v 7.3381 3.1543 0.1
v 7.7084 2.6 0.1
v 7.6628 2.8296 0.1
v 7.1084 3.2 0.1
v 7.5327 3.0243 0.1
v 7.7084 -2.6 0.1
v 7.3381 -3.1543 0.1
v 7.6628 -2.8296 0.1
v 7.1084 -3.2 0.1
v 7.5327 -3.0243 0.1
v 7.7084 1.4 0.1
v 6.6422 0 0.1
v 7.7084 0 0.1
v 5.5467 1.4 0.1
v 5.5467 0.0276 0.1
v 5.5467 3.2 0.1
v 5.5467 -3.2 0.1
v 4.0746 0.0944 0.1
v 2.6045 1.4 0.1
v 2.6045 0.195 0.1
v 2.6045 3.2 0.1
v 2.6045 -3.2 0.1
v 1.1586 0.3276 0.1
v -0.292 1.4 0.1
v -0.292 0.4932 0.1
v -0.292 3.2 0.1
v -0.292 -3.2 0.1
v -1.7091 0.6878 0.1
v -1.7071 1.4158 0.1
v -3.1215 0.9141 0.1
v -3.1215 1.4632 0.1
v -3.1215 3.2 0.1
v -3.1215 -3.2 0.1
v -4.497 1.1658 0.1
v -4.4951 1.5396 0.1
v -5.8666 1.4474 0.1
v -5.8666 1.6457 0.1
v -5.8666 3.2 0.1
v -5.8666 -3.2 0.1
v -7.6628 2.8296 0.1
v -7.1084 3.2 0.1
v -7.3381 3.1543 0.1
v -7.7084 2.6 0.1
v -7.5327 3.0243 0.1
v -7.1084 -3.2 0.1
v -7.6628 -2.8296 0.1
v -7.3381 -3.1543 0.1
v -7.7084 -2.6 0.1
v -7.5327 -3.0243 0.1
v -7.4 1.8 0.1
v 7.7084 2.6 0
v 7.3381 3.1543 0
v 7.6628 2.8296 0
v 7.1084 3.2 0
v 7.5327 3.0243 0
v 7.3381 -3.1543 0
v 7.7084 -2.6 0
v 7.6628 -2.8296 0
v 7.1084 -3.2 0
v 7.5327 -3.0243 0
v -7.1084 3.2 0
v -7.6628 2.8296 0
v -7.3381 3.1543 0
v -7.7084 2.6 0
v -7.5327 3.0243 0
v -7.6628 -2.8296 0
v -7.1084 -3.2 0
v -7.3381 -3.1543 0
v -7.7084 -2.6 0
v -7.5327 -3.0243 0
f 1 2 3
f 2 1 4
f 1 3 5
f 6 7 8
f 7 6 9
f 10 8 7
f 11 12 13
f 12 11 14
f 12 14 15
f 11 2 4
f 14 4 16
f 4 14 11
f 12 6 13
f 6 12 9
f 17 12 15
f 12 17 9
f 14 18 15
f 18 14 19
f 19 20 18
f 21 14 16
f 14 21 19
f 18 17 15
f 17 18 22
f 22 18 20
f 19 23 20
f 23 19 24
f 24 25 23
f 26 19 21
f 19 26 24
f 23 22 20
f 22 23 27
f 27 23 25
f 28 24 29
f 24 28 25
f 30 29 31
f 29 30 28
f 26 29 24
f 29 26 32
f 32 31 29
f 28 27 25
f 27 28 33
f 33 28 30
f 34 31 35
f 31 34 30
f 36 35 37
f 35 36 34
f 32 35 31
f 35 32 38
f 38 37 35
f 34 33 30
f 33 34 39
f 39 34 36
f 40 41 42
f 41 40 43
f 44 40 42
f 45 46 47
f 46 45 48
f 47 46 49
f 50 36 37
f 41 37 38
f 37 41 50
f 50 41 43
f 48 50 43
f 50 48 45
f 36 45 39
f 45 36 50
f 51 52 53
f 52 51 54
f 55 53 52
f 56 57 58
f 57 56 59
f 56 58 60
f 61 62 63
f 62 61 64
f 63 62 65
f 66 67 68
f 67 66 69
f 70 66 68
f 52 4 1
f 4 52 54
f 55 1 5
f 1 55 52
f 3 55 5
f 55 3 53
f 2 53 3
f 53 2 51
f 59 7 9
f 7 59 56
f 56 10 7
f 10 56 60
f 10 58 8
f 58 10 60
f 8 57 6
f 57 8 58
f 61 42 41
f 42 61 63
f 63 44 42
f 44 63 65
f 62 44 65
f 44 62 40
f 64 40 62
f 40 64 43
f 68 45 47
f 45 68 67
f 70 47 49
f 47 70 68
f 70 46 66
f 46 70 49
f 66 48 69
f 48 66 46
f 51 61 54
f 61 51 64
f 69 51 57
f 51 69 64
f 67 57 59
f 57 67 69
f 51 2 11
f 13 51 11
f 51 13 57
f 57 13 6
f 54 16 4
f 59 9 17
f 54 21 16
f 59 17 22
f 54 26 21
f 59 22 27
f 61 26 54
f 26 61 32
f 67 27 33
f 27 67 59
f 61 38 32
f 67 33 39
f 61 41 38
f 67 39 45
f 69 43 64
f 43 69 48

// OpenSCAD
// file: ../p/1-4cyli.scad
use <../lib.scad>
function ldraw_lib__1_4cyli() = [
// 0 Cylinder 0.25
// 0 Name: 1-4cyli.dat
// 0 Author: James Jessiman
// 0 !LDRAW_ORG Primitive UPDATE 2012-01
// 0 !LICENSE Licensed under CC BY 4.0 : see CAreadme.txt
// 
// 0 BFC CERTIFY CCW
  [0,"BFC","CERTIFY"],
  [0,"BFC","CCW"],
// 
// 0 !HISTORY 2002-03-23 [sbliss] Added BFC statement.
// 0 !HISTORY 2002-04-25 [PTadmin] Official Update 2002-02
// 0 !HISTORY 2007-06-22 [PTadmin] Header formatted for Contributor Agreement
// 0 !HISTORY 2008-07-01 [PTadmin] Official Update 2008-01
// 0 !HISTORY 2012-02-16 [Philo] Changed to CCW
// 0 !HISTORY 2012-03-30 [PTadmin] Official Update 2012-01
// 
// 
// 4 16 1 1 0 0.9239 1 0.3827 0.9239 0 0.3827 1 0 0
  [4,16,1,1,0,0.9239,1,0.3827,0.9239,0,0.3827,1,0,0],
// 5 24 1 0 0 1 1 0 0.9239 0 0.3827 1 0 -1
  [5,24,1,0,0,1,1,0,0.9239,0,0.3827,1,0,-1],
// 4 16 0.9239 1 0.3827 0.7071 1 0.7071 0.7071 0 0.7071 0.9239 0 0.3827
  [4,16,0.9239,1,0.3827,0.7071,1,0.7071,0.7071,0,0.7071,0.9239,0,0.3827],
// 5 24 0.9239 0 0.3827 0.9239 1 0.3827 0.7071 0 0.7071 1 0 0
  [5,24,0.9239,0,0.3827,0.9239,1,0.3827,0.7071,0,0.7071,1,0,0],
// 4 16 0.7071 1 0.7071 0.3827 1 0.9239 0.3827 0 0.9239 0.7071 0 0.7071
  [4,16,0.7071,1,0.7071,0.3827,1,0.9239,0.3827,0,0.9239,0.7071,0,0.7071],
// 5 24 0.7071 0 0.7071 0.7071 1 0.7071 0.3827 0 0.9239 0.9239 0 0.3827
  [5,24,0.7071,0,0.7071,0.7071,1,0.7071,0.3827,0,0.9239,0.9239,0,0.3827],
// 4 16 0.3827 1 0.9239 0 1 1 0 0 1 0.3827 0 0.9239
  [4,16,0.3827,1,0.9239,0,1,1,0,0,1,0.3827,0,0.9239],
// 5 24 0.3827 0 0.9239 0.3827 1 0.9239 0 0 1 0.7071 0 0.7071
  [5,24,0.3827,0,0.9239,0.3827,1,0.9239,0,0,1,0.7071,0,0.7071],
// 5 24 0 0 1 0 1 1 0.3827 0 0.9239 -1 0 1
  [5,24,0,0,1,0,1,1,0.3827,0,0.9239,-1,0,1],
];
module ldraw_lib__1_4cyli(step=0, col=false, unit=2/5, alt=false, line=0.2, solid=!$preview)
    makepoly(ldraw_lib__1_4cyli(), step=step, col=col, unit=unit, alt=alt, line=line, solid=solid);
ldraw_lib__1_4cyli(line=0.2);
// file: ../p/1-4chrd.scad
use <../lib.scad>
function ldraw_lib__1_4chrd() = [
// 0 Chord 0.25
// 0 Name: 1-4chrd.dat
// 0 Author: Tony Hafner [hafhead]
// 0 !LDRAW_ORG Primitive UPDATE 2012-02
// 0 !LICENSE Licensed under CC BY 2.0 and CC BY 4.0 : see CAreadme.txt
// 
// 0 BFC CERTIFY CCW
  [0,"BFC","CERTIFY"],
  [0,"BFC","CCW"],
// 
// 0 !HISTORY 2004-04-22 [PTadmin] Official Update 2004-02
// 0 !HISTORY 2007-10-09 [PTadmin] Header formatted for Contributor Agreement
// 0 !HISTORY 2008-07-01 [PTadmin] Official Update 2008-01
// 0 !HISTORY 2012-08-02 [MMR1988] Re-creation with PrimGen2 and Rectifier
// 0 !HISTORY 2012-08-09 [PTadmin] Official Update 2012-02
// 
// 
// 4 16 0.9239 0 0.3827 0.3827 0 0.9239 0 0 1 1 0 0
  [4,16,0.9239,0,0.3827,0.3827,0,0.9239,0,0,1,1,0,0],
// 3 16 0.7071 0 0.7071 0.3827 0 0.9239 0.9239 0 0.3827
  [3,16,0.7071,0,0.7071,0.3827,0,0.9239,0.9239,0,0.3827],
];
module ldraw_lib__1_4chrd(step=0, col=false, unit=2/5, alt=false, line=0.2, solid=!$preview)
    makepoly(ldraw_lib__1_4chrd(), step=step, col=col, unit=unit, alt=alt, line=line, solid=solid);
ldraw_lib__1_4chrd(line=0.2);
// file: s/6142617fs07.scad
use <../../lib.scad>
use <../../p/1-4chrd.scad>
use <../../p/1-4cyli.scad>
function ldraw_lib__s__6142617fs07() = [
// 0 ~Sticker  0.8 x  1.9 with Black Arc on Red Background Left - Bottom Face
// 0 Name: s\6142617fs07.dat
// 0 Author: Massimo Maso [Sirio]
// 0 !LDRAW_ORG Subpart UPDATE 2023-04
// 0 !LICENSE Licensed under CC BY 4.0 : see CAreadme.txt
// 
// 0 BFC CERTIFY CCW
  [0,"BFC","CERTIFY"],
  [0,"BFC","CCW"],
// 
// 0 !HISTORY 2023-08-25 [OrionP] Official Update 2023-04
// 
// 
// 0 // Primitives
// 1 16 -6.5 0 17.7711 -1.5 0 0 0 -1 0 0 0 1.5 1-4chrd.dat
  [1,16,-6.5,0,17.7711,-1.5,0,0,0,-1,0,0,0,1.5, ldraw_lib__1_4chrd()],
// 1 16 6.5 0 17.7711 1.5 0 0 0 -1 0 0 0 1.5 1-4chrd.dat
  [1,16,6.5,0,17.7711,1.5,0,0,0,-1,0,0,0,1.5, ldraw_lib__1_4chrd()],
// 1 16 -6.5 0 -17.7711 -1.5 0 0 0 -1 0 0 0 -1.5 1-4chrd.dat
  [1,16,-6.5,0,-17.7711,-1.5,0,0,0,-1,0,0,0,-1.5, ldraw_lib__1_4chrd()],
// 1 16 6.5 0 -17.7711 1.5 0 0 0 -1 0 0 0 -1.5 1-4chrd.dat
  [1,16,6.5,0,-17.7711,1.5,0,0,0,-1,0,0,0,-1.5, ldraw_lib__1_4chrd()],
// 1 16 -6.5 -0.25 17.7711 -1.5 0 0 0 0.25 0 0 0 1.5 1-4cyli.dat
  [1,16,-6.5,-0.25,17.7711,-1.5,0,0,0,0.25,0,0,0,1.5, ldraw_lib__1_4cyli()],
// 1 16 6.5 -0.25 17.7711 1.5 0 0 0 0.25 0 0 0 1.5 1-4cyli.dat
  [1,16,6.5,-0.25,17.7711,1.5,0,0,0,0.25,0,0,0,1.5, ldraw_lib__1_4cyli()],
// 1 16 -6.5 -0.25 -17.7711 -1.5 0 0 0 0.25 0 0 0 -1.5 1-4cyli.dat
  [1,16,-6.5,-0.25,-17.7711,-1.5,0,0,0,0.25,0,0,0,-1.5, ldraw_lib__1_4cyli()],
// 1 16 6.5 -0.25 -17.7711 1.5 0 0 0 0.25 0 0 0 -1.5 1-4cyli.dat
  [1,16,6.5,-0.25,-17.7711,1.5,0,0,0,0.25,0,0,0,-1.5, ldraw_lib__1_4cyli()],
// 0 // Bottom face
// 4 16 -6.5 0 19.2711 -6.5 0 -19.2711 -8 0 -17.7711 -8 0 17.7711
  [4,16,-6.5,0,19.2711,-6.5,0,-19.2711,-8,0,-17.7711,-8,0,17.7711],
// 4 16 -6.5 0 19.2711 6.5 0 19.2711 6.5 0 -19.2711 -6.5 0 -19.2711
  [4,16,-6.5,0,19.2711,6.5,0,19.2711,6.5,0,-19.2711,-6.5,0,-19.2711],
// 4 16 6.5 0 19.2711 8 0 17.7711 8 0 -17.7711 6.5 0 -19.2711
  [4,16,6.5,0,19.2711,8,0,17.7711,8,0,-17.7711,6.5,0,-19.2711],
// 0 // Lateral face
// 3 16 -6.5 0 19.2711 -6.5 -.25 19.2711 -3.5 -.25 19.2711
  [3,16,-6.5,0,19.2711,-6.5,-.25,19.2711,-3.5,-.25,19.2711],
// 4 16 -6.5 0 19.2711 -3.5 -.25 19.2711 0 -.25 19.2711 6.5 0 19.2711
  [4,16,-6.5,0,19.2711,-3.5,-.25,19.2711,0,-.25,19.2711,6.5,0,19.2711],
// 3 16 6.5 0 19.2711 0 -.25 19.2711 6.5 -.25 19.2711
  [3,16,6.5,0,19.2711,0,-.25,19.2711,6.5,-.25,19.2711],
// 3 16 -8 0 17.7711 -8 -.25 13.8668 -8 -.25 17.7711
  [3,16,-8,0,17.7711,-8,-.25,13.8668,-8,-.25,17.7711],
// 3 16 8 0 17.7711 8 -.25 17.7711 8 -.25 13.8668
  [3,16,8,0,17.7711,8,-.25,17.7711,8,-.25,13.8668],
// 3 16 -8 0 17.7711 -8 -.25 6.5112 -8 -.25 13.8668
  [3,16,-8,0,17.7711,-8,-.25,6.5112,-8,-.25,13.8668],
// 3 16 8 0 17.7711 8 -.25 13.8668 8 -.25 6.5112
  [3,16,8,0,17.7711,8,-.25,13.8668,8,-.25,6.5112],
// 3 16 -8 0 17.7711 -8 -.25 -.73 -8 -.25 6.5112
  [3,16,-8,0,17.7711,-8,-.25,-.73,-8,-.25,6.5112],
// 3 16 8 0 17.7711 8 -.25 6.5112 8 -.25 -.73
  [3,16,8,0,17.7711,8,-.25,6.5112,8,-.25,-.73],
// 4 16 -8 0 17.7711 -8 0 -17.7711 -8 -.25 -7.8038 -8 -.25 -.73
  [4,16,-8,0,17.7711,-8,0,-17.7711,-8,-.25,-7.8038,-8,-.25,-.73],
// 4 16 8 0 17.7711 8 -.25 -.73 8 -.25 -7.8038 8 0 -17.7711
  [4,16,8,0,17.7711,8,-.25,-.73,8,-.25,-7.8038,8,0,-17.7711],
// 3 16 -8 0 -17.7711 -8 -.25 -14.6666 -8 -.25 -7.8038
  [3,16,-8,0,-17.7711,-8,-.25,-14.6666,-8,-.25,-7.8038],
// 3 16 8 0 -17.7711 8 -.25 -7.8038 8 -.25 -14.6666
  [3,16,8,0,-17.7711,8,-.25,-7.8038,8,-.25,-14.6666],
// 3 16 -8 0 -17.7711 -8 -.25 -17.7711 -8 -.25 -14.6666
  [3,16,-8,0,-17.7711,-8,-.25,-17.7711,-8,-.25,-14.6666],
// 3 16 8 0 -17.7711 8 -.25 -14.6666 8 -.25 -17.7711
  [3,16,8,0,-17.7711,8,-.25,-14.6666,8,-.25,-17.7711],
// 4 16 -6.5 0 -19.2711 6.5 0 -19.2711 6.5 -.25 -19.2711 -6.5 -.25 -19.2711
  [4,16,-6.5,0,-19.2711,6.5,0,-19.2711,6.5,-.25,-19.2711,-6.5,-.25,-19.2711],
];
module ldraw_lib__s__6142617fs07(step=0, col=false, unit=2/5, alt=false, line=0.2, solid=!$preview)
    makepoly(ldraw_lib__s__6142617fs07(), step=step, col=col, unit=unit, alt=alt, line=line, solid=solid);
ldraw_lib__s__6142617fs07(line=0.2);
// file: s/6142617fs06.scad
use <../../lib.scad>
use <../../p/1-4chrd.scad>
function ldraw_lib__s__6142617fs06() = [
// 0 ~Sticker  0.8 x  1.9 with Black Arc on Red Background Left - Sixth Face
// 0 Name: s\6142617fs06.dat
// 0 Author: Massimo Maso [Sirio]
// 0 !LDRAW_ORG Subpart UPDATE 2023-04
// 0 !LICENSE Licensed under CC BY 4.0 : see CAreadme.txt
// 
// 0 BFC CERTIFY CCW
  [0,"BFC","CERTIFY"],
  [0,"BFC","CCW"],
// 
// 0 !HISTORY 2023-08-25 [OrionP] Official Update 2023-04
// 
// 
// 0 // Primitives
// 1 4 -6.5 -.25 -3.0901 -1.5 0 0 0 1 0 0 0 -1.5 1-4chrd.dat
  [1,4,-6.5,-.25,-3.0901,-1.5,0,0,0,1,0,0,0,-1.5, ldraw_lib__1_4chrd()],
// 1 4 6.5 -.25 -3.0901 1.5 0 0 0 1 0 0 0 -1.5 1-4chrd.dat
  [1,4,6.5,-.25,-3.0901,1.5,0,0,0,1,0,0,0,-1.5, ldraw_lib__1_4chrd()],
// 0 // Black faces
// 3 0 -4.5 -.25 -3.819 -3.6185 -.25 .0144 -4.1143 -.25 .0144
  [3,0,-4.5,-.25,-3.819,-3.6185,-.25,.0144,-4.1143,-.25,.0144],
// 0 // Red faces
// 4 4 -4.5 -.25 -3.819 -4.1143 -.25 .0144 -8 -.25 .0144 -8 -.25 -3.0901
  [4,4,-4.5,-.25,-3.819,-4.1143,-.25,.0144,-8,-.25,.0144,-8,-.25,-3.0901],
// 3 4 -4.5 -.25 -3.819 -8 -.25 -3.0901 -6.5 -.25 -4.5901
  [3,4,-4.5,-.25,-3.819,-8,-.25,-3.0901,-6.5,-.25,-4.5901],
// 4 4 -4.5 -.25 -3.819 -6.5 -.25 -4.5901 6.5 -.25 -4.5901 8 -.25 -3.0901
  [4,4,-4.5,-.25,-3.819,-6.5,-.25,-4.5901,6.5,-.25,-4.5901,8,-.25,-3.0901],
// 4 4 -4.5 -.25 -3.819 8 -.25 -3.0901 8 -.25 .0144 -3.6185 -.25 .0144
  [4,4,-4.5,-.25,-3.819,8,-.25,-3.0901,8,-.25,.0144,-3.6185,-.25,.0144],
];
module ldraw_lib__s__6142617fs06(step=0, col=false, unit=2/5, alt=false, line=0.2, solid=!$preview)
    makepoly(ldraw_lib__s__6142617fs06(), step=step, col=col, unit=unit, alt=alt, line=line, solid=solid);
ldraw_lib__s__6142617fs06(line=0.2);
// file: s/6142617fs05.scad
use <../../lib.scad>
function ldraw_lib__s__6142617fs05() = [
// 0 ~Sticker  0.8 x  1.9 with Black Arc on Red Background Left - Fifth Face
// 0 Name: s\6142617fs05.dat
// 0 Author: Massimo Maso [Sirio]
// 0 !LDRAW_ORG Subpart UPDATE 2023-04
// 0 !LICENSE Licensed under CC BY 4.0 : see CAreadme.txt
// 
// 0 BFC CERTIFY CCW
  [0,"BFC","CERTIFY"],
  [0,"BFC","CCW"],
// 
// 0 !HISTORY 2023-08-25 [OrionP] Official Update 2023-04
// 
// 
// 0 // Black faces
// 4 0 -3.8489 -.25 3.4145 -2.9144 -.25 3.4097 -2.2852 -.25 6.8484 -3.658 -.25 6.8484
  [4,0,-3.8489,-.25,3.4145,-2.9144,-.25,3.4097,-2.2852,-.25,6.8484,-3.658,-.25,6.8484],
// 4 0 -3.8489 -.25 3.4145 -4.1143 -.25 -.0144 -3.6185 -.25 -.0144 -2.9144 -.25 3.4097
  [4,0,-3.8489,-.25,3.4145,-4.1143,-.25,-.0144,-3.6185,-.25,-.0144,-2.9144,-.25,3.4097],
// 0 // Red faces
// 4 4 -8 -.25 -.0144 -3.8489 -.25 3.4145 -3.658 -.25 6.8484 -8 -.25 6.8484
  [4,4,-8,-.25,-.0144,-3.8489,-.25,3.4145,-3.658,-.25,6.8484,-8,-.25,6.8484],
// 3 4 -8 -.25 -.0144 -4.1143 -.25 -.0144 -3.8489 -.25 3.4145
  [3,4,-8,-.25,-.0144,-4.1143,-.25,-.0144,-3.8489,-.25,3.4145],
// 4 4 8 -.25 -.0144 8 -.25 6.8484 -2.2852 -.25 6.8484 -2.9144 -.25 3.4097
  [4,4,8,-.25,-.0144,8,-.25,6.8484,-2.2852,-.25,6.8484,-2.9144,-.25,3.4097],
// 3 4 8 -.25 -.0144 -2.9144 -.25 3.4097 -3.6185 -.25 -.0144
  [3,4,8,-.25,-.0144,-2.9144,-.25,3.4097,-3.6185,-.25,-.0144],
];
module ldraw_lib__s__6142617fs05(step=0, col=false, unit=2/5, alt=false, line=0.2, solid=!$preview)
    makepoly(ldraw_lib__s__6142617fs05(), step=step, col=col, unit=unit, alt=alt, line=line, solid=solid);
ldraw_lib__s__6142617fs05(line=0.2);
// file: s/6142617fs04.scad
use <../../lib.scad>
function ldraw_lib__s__6142617fs04() = [
// 0 ~Sticker  0.8 x  1.9 with Black Arc on Red Background Left - Fourth Face
// 0 Name: s\6142617fs04.dat
// 0 Author: Massimo Maso [Sirio]
// 0 !LDRAW_ORG Subpart UPDATE 2023-04
// 0 !LICENSE Licensed under CC BY 4.0 : see CAreadme.txt
// 
// 0 BFC CERTIFY CCW
  [0,"BFC","CERTIFY"],
  [0,"BFC","CCW"],
// 
// 0 !HISTORY 2023-08-25 [OrionP] Official Update 2023-04
// 
// 
// 0 // Black faces
// 
// 4 0 -3.5395 -.25 -3.525 -1.7195 -.25 -3.53 -1.2329 -.25 .0128 -3.5 -.25 .0128
  [4,0,-3.5395,-.25,-3.525,-1.7195,-.25,-3.53,-1.2329,-.25,.0128,-3.5,-.25,.0128],
// 4 0 -3.5395 -.25 -3.525 -3.658 -.25 -7.061 -2.2852 -.25 -7.061 -1.7195 -.25 -3.53
  [4,0,-3.5395,-.25,-3.525,-3.658,-.25,-7.061,-2.2852,-.25,-7.061,-1.7195,-.25,-3.53],
// 0 // Red faces
// 4 4 -8 -.25 -7.061 -3.5395 -.25 -3.525 -3.5 -.25 .0128 -8 -.25 .0128
  [4,4,-8,-.25,-7.061,-3.5395,-.25,-3.525,-3.5,-.25,.0128,-8,-.25,.0128],
// 3 4 -8 -.25 -7.061 -3.658 -.25 -7.061 -3.5395 -.25 -3.525
  [3,4,-8,-.25,-7.061,-3.658,-.25,-7.061,-3.5395,-.25,-3.525],
// 4 4 8 -.25 -7.061 8 -.25 .0128 -1.2329 -.25 .0128 -1.7195 -.25 -3.53
  [4,4,8,-.25,-7.061,8,-.25,.0128,-1.2329,-.25,.0128,-1.7195,-.25,-3.53],
// 3 4 8 -.25 -7.061 -1.7195 -.25 -3.53 -2.2852 -.25 -7.061
  [3,4,8,-.25,-7.061,-1.7195,-.25,-3.53,-2.2852,-.25,-7.061],
];
module ldraw_lib__s__6142617fs04(step=0, col=false, unit=2/5, alt=false, line=0.2, solid=!$preview)
    makepoly(ldraw_lib__s__6142617fs04(), step=step, col=col, unit=unit, alt=alt, line=line, solid=solid);
ldraw_lib__s__6142617fs04(line=0.2);
// file: s/6142617fs03.scad
use <../../lib.scad>
function ldraw_lib__s__6142617fs03() = [
// 0 ~Sticker  0.8 x  1.9 with Black Arc on Red Background Left - Third Face
// 0 Name: s\6142617fs03.dat
// 0 Author: Massimo Maso [Sirio]
// 0 !LDRAW_ORG Subpart UPDATE 2023-04
// 0 !LICENSE Licensed under CC BY 4.0 : see CAreadme.txt
// 
// 0 BFC CERTIFY CCW
  [0,"BFC","CERTIFY"],
  [0,"BFC","CCW"],
// 
// 0 !HISTORY 2023-08-25 [OrionP] Official Update 2023-04
// 
// 
// 0 // Black faces
// 
// 4 0 -3.5 -.25 -.0128 -.8189 -.25 3.6136 -.4874 -.25 7.2284 -3.5 -.25 7.2284
  [4,0,-3.5,-.25,-.0128,-.8189,-.25,3.6136,-.4874,-.25,7.2284,-3.5,-.25,7.2284],
// 3 0 -3.5 -.25 -.0128 -1.2329 -.25 -.0128 -.8189 -.25 3.6136
  [3,0,-3.5,-.25,-.0128,-1.2329,-.25,-.0128,-.8189,-.25,3.6136],
// 0 // Red faces
// 4 4 -8 -.25 7.2284 -8 -.25 -.0128 -3.5 -.25 -.0128 -3.5 -.25 7.2284
  [4,4,-8,-.25,7.2284,-8,-.25,-.0128,-3.5,-.25,-.0128,-3.5,-.25,7.2284],
// 4 4 -.4874 -.25 7.2284 -.8189 -.25 3.6136 8 -.25 -.0128 8 -.25 7.2284
  [4,4,-.4874,-.25,7.2284,-.8189,-.25,3.6136,8,-.25,-.0128,8,-.25,7.2284],
// 3 4 8 -.25 -.0128 -.8189 -.25 3.6136 -1.2329 -.25 -.0128
  [3,4,8,-.25,-.0128,-.8189,-.25,3.6136,-1.2329,-.25,-.0128],
];
module ldraw_lib__s__6142617fs03(step=0, col=false, unit=2/5, alt=false, line=0.2, solid=!$preview)
    makepoly(ldraw_lib__s__6142617fs03(), step=step, col=col, unit=unit, alt=alt, line=line, solid=solid);
ldraw_lib__s__6142617fs03(line=0.2);
// file: s/6142617fs02.scad
use <../../lib.scad>
function ldraw_lib__s__6142617fs02() = [
// 0 ~Sticker  0.8 x  1.9 with Black Arc on Red Background Left - Second Face
// 0 Name: s\6142617fs02.dat
// 0 Author: Massimo Maso [Sirio]
// 0 !LDRAW_ORG Subpart UPDATE 2023-04
// 0 !LICENSE Licensed under CC BY 4.0 : see CAreadme.txt
// 
// 0 BFC CERTIFY CCW
  [0,"BFC","CERTIFY"],
  [0,"BFC","CCW"],
// 
// 0 !HISTORY 2023-08-25 [OrionP] Official Update 2023-04
// 
// 
// 0 // Black faces
// 
// 4 0 -3.5 -.25 -7.3435 -.2359 -.25 -3.6681 -.0691 -.25 .0121 -3.5 -.25 .0121
  [4,0,-3.5,-.25,-7.3435,-.2359,-.25,-3.6681,-.0691,-.25,.0121,-3.5,-.25,.0121],
// 3 0 -3.5 -.25 -7.3435 -.4874 -.25 -7.3435 -.2359 -.25 -3.6681
  [3,0,-3.5,-.25,-7.3435,-.4874,-.25,-7.3435,-.2359,-.25,-3.6681],
// 0 // Red faces
// 4 4 -8 -.25 .0121 -8 -.25 -7.3435 -3.5 -.25 -7.3435 -3.5 -.25 .0121
  [4,4,-8,-.25,.0121,-8,-.25,-7.3435,-3.5,-.25,-7.3435,-3.5,-.25,.0121],
// 4 4 -.0691 -.25 .0121 -.2359 -.25 -3.6681 8 -.25 -7.3435 8 -.25 .0121
  [4,4,-.0691,-.25,.0121,-.2359,-.25,-3.6681,8,-.25,-7.3435,8,-.25,.0121],
// 3 4 8 -.25 -7.3435 -.2359 -.25 -3.6681 -.4874 -.25 -7.3435
  [3,4,8,-.25,-7.3435,-.2359,-.25,-3.6681,-.4874,-.25,-7.3435],
];
module ldraw_lib__s__6142617fs02(step=0, col=false, unit=2/5, alt=false, line=0.2, solid=!$preview)
    makepoly(ldraw_lib__s__6142617fs02(), step=step, col=col, unit=unit, alt=alt, line=line, solid=solid);
ldraw_lib__s__6142617fs02(line=0.2);
// file: s/6142617fs01.scad
use <../../lib.scad>
use <../../p/1-4chrd.scad>
function ldraw_lib__s__6142617fs01() = [
// 0 ~Sticker  0.8 x  1.9 with Black Arc on Red Background Left - First Face
// 0 Name: s\6142617fs01.dat
// 0 Author: Massimo Maso [Sirio]
// 0 !LDRAW_ORG Subpart UPDATE 2023-04
// 0 !LICENSE Licensed under CC BY 4.0 : see CAreadme.txt
// 
// 0 BFC CERTIFY CCW
  [0,"BFC","CERTIFY"],
  [0,"BFC","CCW"],
// 
// 0 !HISTORY 2023-08-25 [OrionP] Official Update 2023-04
// 
// 
// 0 // Primitives
// 1 4 -6.5 -.25 3.8922 -1.5 0 0 0 1 0 0 0 1.5 1-4chrd.dat
  [1,4,-6.5,-.25,3.8922,-1.5,0,0,0,1,0,0,0,1.5, ldraw_lib__1_4chrd()],
// 1 4 6.5 -.25 3.8922 1.5 0 0 0 1 0 0 0 1.5 1-4chrd.dat
  [1,4,6.5,-.25,3.8922,1.5,0,0,0,1,0,0,0,1.5, ldraw_lib__1_4chrd()],
// 0 // Black faces
// 4 0 0 -.25 2.7265 0 -.25 5.3922 -3.5 -.25 5.3922 -3.5 -.25 -.0121
  [4,0,0,-.25,2.7265,0,-.25,5.3922,-3.5,-.25,5.3922,-3.5,-.25,-.0121],
// 3 0 0 -.25 2.7265 -3.5 -.25 -.0121 -.0691 -.25 -.0121
  [3,0,0,-.25,2.7265,-3.5,-.25,-.0121,-.0691,-.25,-.0121],
// 0 // Red faces
// 3 4 -3.5 -.25 5.3922 -6.5 -.25 5.3922 -8 -.25 3.8922
  [3,4,-3.5,-.25,5.3922,-6.5,-.25,5.3922,-8,-.25,3.8922],
// 4 4 -3.5 -.25 5.3922 -8 -.25 3.8922 -8 -.25 -.0121 -3.5 -.25 -.0121
  [4,4,-3.5,-.25,5.3922,-8,-.25,3.8922,-8,-.25,-.0121,-3.5,-.25,-.0121],
// 4 4 0 -.25 5.3922 0 -.25 2.7265 8 -.25 3.8922 6.5 -.25 5.3922
  [4,4,0,-.25,5.3922,0,-.25,2.7265,8,-.25,3.8922,6.5,-.25,5.3922],
// 4 4 0 -.25 2.7265 -.0691 -.25 -.0121 8 -.25 -.0121 8 -.25 3.8922
  [4,4,0,-.25,2.7265,-.0691,-.25,-.0121,8,-.25,-.0121,8,-.25,3.8922],
];
module ldraw_lib__s__6142617fs01(step=0, col=false, unit=2/5, alt=false, line=0.2, solid=!$preview)
    makepoly(ldraw_lib__s__6142617fs01(), step=step, col=col, unit=unit, alt=alt, line=line, solid=solid);
ldraw_lib__s__6142617fs01(line=0.2);
// main file
use <../lib.scad>
use <s/6142617fs01.scad>
use <s/6142617fs02.scad>
use <s/6142617fs03.scad>
use <s/6142617fs04.scad>
use <s/6142617fs05.scad>
use <s/6142617fs06.scad>
use <s/6142617fs07.scad>
function ldraw_lib__6142617f() = [
// 0 Sticker  0.8 x  1.9 with Black Arc on Red Background Left
// 0 Name: 6142617f.dat
// 0 Author: Massimo Maso [Sirio]
// 0 !LDRAW_ORG Part UPDATE 2023-04
// 0 !LICENSE Licensed under CC BY 4.0 : see CAreadme.txt
// 
// 0 BFC CERTIFY CCW
  [0,"BFC","CERTIFY"],
  [0,"BFC","CCW"],
// 
// 0 !KEYWORDS Camaro, Chevrolet, Drag, Race, Set 75874, Speed Champions, SS
// 
// 0 !HISTORY 2023-08-25 [OrionP] Official Update 2023-04
// 
// 
// 1 16 13.8789 0 0 0 0 1 0 1 0 -1 0 0 s\6142617fs01.dat
  [1,16,13.8789,0,0,0,0,1,0,1,0,-1,0,0, ldraw_lib__s__6142617fs01()],
// 1 16 13.8547 0 0 0 0 1 0 1 0 -1 0 0 s\6142617fs02.dat
  [1,16,13.8547,0,0,0,0,1,0,1,0,-1,0,0, ldraw_lib__s__6142617fs02()],
// 1 16 -.7172 0 0 0 0 1 0 1 0 -1 0 0 s\6142617fs03.dat
  [1,16,-.7172,0,0,0,0,1,0,1,0,-1,0,0, ldraw_lib__s__6142617fs03()],
// 1 16 -.7428 0 0 0 0 1 0 1 0 -1 0 0 s\6142617fs04.dat
  [1,16,-.7428,0,0,0,0,1,0,1,0,-1,0,0, ldraw_lib__s__6142617fs04()],
// 1 16 -14.6522 0 0 0 0 1 0 1 0 -1 0 0 s\6142617fs05.dat
  [1,16,-14.6522,0,0,0,0,1,0,1,0,-1,0,0, ldraw_lib__s__6142617fs05()],
// 1 16 -14.681 0 0 0 0 1 0 1 0 -1 0 0 s\6142617fs06.dat
  [1,16,-14.681,0,0,0,0,1,0,1,0,-1,0,0, ldraw_lib__s__6142617fs06()],
// 1 16 0 0 0 0 0 1 0 1 0 -1 0 0 s\6142617fs07.dat
  [1,16,0,0,0,0,0,1,0,1,0,-1,0,0, ldraw_lib__s__6142617fs07()],
];
module ldraw_lib__6142617f(step=0, col=false, unit=2/5, alt=false, line=0.2, solid=!$preview)
    makepoly(ldraw_lib__6142617f(), step=step, col=col, unit=unit, alt=alt, line=line, solid=solid);
ldraw_lib__6142617f(line=0.2);
